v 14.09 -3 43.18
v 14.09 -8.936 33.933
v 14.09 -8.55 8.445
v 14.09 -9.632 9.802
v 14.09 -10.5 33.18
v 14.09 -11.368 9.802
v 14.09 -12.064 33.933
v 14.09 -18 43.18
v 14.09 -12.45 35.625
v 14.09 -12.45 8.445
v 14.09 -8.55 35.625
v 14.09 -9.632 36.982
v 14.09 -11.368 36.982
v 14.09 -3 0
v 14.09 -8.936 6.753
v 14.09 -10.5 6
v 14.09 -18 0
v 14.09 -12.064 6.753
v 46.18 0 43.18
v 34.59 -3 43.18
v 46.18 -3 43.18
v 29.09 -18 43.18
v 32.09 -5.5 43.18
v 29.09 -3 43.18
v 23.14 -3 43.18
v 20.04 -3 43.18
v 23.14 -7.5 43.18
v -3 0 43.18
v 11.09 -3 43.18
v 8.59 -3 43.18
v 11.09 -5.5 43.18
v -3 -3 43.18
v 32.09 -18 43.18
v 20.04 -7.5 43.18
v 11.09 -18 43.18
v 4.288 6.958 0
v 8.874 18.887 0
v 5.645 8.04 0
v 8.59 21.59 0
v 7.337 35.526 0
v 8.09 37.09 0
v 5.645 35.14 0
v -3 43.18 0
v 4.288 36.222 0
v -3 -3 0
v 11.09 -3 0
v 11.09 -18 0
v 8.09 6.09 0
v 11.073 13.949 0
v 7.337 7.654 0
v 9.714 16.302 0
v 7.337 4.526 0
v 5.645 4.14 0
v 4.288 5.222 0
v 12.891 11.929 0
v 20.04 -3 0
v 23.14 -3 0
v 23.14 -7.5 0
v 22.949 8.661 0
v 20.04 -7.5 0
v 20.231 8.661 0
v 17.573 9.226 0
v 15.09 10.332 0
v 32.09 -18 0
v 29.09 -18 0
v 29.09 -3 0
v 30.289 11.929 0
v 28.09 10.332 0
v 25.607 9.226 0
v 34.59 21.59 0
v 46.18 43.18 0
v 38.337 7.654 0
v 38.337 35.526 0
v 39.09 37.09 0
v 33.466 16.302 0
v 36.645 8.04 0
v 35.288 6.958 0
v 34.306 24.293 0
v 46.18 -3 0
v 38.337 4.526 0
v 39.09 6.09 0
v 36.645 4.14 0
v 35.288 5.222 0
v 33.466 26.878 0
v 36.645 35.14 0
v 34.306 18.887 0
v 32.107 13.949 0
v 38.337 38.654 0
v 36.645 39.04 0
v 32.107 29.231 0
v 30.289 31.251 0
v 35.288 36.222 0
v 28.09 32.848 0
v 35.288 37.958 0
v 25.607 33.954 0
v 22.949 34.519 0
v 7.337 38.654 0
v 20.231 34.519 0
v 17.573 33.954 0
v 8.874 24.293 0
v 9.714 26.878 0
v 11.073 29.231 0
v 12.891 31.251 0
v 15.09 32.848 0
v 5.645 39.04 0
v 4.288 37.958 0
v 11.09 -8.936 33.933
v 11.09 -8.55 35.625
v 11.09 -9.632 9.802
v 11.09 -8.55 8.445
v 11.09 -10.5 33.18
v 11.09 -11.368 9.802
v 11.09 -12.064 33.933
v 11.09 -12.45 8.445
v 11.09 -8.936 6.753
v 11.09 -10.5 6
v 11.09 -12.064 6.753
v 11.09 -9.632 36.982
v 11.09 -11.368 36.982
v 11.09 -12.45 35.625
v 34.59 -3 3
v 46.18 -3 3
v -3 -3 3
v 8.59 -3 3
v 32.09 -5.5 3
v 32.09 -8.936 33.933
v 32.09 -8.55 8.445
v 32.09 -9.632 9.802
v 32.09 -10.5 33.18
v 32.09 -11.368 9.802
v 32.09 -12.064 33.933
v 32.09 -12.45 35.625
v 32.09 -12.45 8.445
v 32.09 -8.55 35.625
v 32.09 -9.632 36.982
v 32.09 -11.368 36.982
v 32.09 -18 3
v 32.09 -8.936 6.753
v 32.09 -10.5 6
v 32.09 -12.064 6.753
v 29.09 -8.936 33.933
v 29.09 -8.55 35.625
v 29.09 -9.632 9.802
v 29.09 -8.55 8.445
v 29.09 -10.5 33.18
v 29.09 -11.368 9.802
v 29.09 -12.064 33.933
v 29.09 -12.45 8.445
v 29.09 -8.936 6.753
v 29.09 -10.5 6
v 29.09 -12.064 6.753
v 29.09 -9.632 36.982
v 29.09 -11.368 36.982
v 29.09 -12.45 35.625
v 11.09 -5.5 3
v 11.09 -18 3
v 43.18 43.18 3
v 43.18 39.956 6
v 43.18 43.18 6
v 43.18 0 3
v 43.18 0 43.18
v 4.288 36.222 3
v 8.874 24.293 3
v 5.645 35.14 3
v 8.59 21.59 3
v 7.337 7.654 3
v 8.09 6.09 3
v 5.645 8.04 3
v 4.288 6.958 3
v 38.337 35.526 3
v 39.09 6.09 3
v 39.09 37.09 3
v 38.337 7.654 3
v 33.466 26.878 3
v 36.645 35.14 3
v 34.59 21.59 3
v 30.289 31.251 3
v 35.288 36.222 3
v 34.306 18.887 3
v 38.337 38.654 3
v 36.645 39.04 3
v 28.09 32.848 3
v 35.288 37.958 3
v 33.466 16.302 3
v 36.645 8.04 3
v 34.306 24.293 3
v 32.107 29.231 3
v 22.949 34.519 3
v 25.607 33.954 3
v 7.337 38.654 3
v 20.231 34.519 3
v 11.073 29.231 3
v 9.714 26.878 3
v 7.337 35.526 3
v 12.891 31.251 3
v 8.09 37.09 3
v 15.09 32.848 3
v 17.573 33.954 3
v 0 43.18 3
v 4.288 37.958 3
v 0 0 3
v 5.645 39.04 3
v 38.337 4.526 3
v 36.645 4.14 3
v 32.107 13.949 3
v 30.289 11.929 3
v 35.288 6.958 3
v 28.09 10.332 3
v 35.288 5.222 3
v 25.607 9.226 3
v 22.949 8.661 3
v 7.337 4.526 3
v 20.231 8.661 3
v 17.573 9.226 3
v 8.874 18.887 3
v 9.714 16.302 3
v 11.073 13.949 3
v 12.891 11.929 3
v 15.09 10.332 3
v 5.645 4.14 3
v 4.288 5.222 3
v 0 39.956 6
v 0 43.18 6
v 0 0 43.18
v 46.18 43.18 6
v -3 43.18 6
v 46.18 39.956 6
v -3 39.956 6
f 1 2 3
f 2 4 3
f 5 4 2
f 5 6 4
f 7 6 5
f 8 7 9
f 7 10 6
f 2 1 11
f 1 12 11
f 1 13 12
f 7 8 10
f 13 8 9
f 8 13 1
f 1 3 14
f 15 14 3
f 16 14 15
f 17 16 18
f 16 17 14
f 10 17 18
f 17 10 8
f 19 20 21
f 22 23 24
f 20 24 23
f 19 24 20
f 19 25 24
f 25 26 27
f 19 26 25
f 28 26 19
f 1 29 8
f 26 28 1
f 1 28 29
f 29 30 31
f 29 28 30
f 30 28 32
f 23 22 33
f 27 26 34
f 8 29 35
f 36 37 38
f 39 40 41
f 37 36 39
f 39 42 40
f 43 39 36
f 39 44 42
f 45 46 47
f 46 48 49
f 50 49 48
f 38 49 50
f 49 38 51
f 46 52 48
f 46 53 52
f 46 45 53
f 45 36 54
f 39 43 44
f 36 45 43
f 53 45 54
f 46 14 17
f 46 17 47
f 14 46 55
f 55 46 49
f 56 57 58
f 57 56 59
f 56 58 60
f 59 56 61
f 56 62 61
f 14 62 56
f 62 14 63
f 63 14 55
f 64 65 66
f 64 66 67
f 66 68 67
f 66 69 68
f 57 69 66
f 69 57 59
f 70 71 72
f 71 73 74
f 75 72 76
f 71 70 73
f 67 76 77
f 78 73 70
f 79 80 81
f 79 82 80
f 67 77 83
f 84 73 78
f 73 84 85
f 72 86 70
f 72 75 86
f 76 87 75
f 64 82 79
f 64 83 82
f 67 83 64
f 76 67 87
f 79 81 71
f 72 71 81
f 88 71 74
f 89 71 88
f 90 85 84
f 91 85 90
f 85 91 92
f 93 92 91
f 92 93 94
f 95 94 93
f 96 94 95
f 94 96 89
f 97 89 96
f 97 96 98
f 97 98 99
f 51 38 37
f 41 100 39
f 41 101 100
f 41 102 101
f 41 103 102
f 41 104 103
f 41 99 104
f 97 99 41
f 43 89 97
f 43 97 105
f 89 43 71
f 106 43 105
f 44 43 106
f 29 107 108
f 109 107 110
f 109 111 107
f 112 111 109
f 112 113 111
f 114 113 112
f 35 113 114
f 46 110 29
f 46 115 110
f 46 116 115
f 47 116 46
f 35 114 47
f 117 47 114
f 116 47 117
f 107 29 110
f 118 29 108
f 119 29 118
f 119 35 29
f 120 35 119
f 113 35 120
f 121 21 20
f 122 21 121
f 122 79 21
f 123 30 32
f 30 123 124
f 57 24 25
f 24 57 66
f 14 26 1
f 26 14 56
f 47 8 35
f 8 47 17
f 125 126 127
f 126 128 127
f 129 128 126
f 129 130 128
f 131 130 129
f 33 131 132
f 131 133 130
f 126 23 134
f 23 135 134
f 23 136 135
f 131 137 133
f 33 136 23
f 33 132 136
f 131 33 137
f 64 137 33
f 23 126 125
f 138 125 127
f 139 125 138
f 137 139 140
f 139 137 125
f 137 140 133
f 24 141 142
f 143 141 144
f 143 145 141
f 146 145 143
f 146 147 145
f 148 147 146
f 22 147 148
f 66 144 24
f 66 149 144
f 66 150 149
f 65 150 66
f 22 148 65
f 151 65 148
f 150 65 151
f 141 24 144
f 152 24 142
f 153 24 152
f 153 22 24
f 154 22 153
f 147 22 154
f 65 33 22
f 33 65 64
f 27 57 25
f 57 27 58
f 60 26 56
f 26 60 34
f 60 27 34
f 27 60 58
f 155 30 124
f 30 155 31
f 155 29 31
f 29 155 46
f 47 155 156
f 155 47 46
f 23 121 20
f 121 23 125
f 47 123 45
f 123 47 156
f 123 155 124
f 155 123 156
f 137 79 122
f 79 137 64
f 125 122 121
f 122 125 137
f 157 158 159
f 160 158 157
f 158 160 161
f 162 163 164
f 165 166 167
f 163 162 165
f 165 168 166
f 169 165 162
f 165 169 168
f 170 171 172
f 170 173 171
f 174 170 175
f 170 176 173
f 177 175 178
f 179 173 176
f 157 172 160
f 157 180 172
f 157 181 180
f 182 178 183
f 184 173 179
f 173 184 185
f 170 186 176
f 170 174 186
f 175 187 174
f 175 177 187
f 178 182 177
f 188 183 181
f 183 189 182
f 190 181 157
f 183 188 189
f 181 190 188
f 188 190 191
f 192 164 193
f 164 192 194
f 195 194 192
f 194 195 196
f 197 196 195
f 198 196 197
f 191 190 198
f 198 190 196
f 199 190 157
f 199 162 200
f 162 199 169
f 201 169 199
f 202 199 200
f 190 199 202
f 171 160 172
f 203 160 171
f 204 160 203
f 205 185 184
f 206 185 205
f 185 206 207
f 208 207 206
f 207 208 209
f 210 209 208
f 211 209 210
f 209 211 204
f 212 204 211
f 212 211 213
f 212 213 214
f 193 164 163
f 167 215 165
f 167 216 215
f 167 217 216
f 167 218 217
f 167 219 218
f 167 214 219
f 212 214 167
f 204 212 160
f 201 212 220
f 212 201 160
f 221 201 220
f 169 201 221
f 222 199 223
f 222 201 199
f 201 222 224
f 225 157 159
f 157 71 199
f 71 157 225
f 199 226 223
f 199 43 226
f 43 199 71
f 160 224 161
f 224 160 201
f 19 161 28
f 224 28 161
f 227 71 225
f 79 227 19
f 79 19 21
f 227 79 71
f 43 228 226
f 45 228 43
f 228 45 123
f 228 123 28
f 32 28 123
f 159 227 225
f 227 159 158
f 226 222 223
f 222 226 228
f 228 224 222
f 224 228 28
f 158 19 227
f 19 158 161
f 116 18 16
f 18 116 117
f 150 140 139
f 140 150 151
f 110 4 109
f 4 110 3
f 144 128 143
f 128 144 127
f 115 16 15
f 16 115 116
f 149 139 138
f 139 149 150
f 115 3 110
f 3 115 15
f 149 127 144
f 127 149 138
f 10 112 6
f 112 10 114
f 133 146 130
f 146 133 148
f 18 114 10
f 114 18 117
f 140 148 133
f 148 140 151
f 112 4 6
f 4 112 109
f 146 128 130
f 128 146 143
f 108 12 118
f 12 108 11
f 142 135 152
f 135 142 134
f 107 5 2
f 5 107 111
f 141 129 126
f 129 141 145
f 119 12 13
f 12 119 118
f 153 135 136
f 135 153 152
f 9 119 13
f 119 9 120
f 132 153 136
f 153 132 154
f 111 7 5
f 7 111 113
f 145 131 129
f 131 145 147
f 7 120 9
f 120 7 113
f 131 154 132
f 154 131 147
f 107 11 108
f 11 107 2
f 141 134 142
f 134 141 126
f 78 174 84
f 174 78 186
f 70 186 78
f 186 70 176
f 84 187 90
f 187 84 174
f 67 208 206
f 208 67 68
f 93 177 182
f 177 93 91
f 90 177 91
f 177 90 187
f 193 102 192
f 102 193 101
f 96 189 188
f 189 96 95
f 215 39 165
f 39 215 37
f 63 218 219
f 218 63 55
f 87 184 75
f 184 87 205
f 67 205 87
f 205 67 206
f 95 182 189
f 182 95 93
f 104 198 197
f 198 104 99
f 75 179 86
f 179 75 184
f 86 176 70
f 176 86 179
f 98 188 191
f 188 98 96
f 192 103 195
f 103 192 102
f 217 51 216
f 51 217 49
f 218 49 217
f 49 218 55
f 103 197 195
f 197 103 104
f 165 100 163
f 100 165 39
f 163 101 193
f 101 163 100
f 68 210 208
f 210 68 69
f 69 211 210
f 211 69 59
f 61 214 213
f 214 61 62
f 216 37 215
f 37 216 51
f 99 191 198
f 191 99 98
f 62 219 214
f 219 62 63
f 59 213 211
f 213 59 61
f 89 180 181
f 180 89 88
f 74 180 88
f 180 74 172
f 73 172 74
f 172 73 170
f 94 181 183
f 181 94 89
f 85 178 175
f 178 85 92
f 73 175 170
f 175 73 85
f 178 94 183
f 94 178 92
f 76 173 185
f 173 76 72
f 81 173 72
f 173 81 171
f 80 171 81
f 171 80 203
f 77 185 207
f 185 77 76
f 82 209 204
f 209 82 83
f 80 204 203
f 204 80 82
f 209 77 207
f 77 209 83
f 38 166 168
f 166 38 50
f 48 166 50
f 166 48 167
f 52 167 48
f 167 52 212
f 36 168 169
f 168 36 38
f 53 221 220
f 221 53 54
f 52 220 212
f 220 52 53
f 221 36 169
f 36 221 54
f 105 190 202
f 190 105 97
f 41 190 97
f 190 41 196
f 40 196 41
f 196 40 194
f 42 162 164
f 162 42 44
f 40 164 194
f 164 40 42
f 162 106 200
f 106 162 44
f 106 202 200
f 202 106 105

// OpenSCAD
//CUSTOMIZER VARIABLES

/* [Basic_Parameters] */

// Stepper Motor Size
motor_index = 4;	// [0:NEMA 8, 1:NEMA 11, 2:NEMA 14, 3:NEMA 16, 4:NEMA 17, 5:NEMA 23, 6:NEMA 34, 7:NEMA 42]

// Parallel or Perpendicular (will need supports)
orientation = 0;	// [0:Parallel, 1:Perpendicular]

// mount thickness, in mm
thickness = 3.0;    // [2:0.1:10]

// Openbeam size, in mm
openbeam_size = 15;   // [10:50]

// Openbeam bolt diameter, in mm
beam_bolt_diameter = 3.0;    // [2:0.1:40]

// Openbeam slot diameter for tight fit, in mm
slot_diameter = 3.1;    // [2:0.1:40]

// Openbeam slot distance to edge for tight fit, in mm
slot_depth = 4.5;    // [2:0.1:40]

//CUSTOMIZER VARIABLES END



// use motor size choice to set the important values

// Values are from multiple sources - nobody seems to have all the numbers right in one place!
// And even different manufacturers can't quite agree on all the dimensions!
// I'm open to corrections and additions - but there had better be a good source behind the new values.

// [ motor width in mm (calculated from inches/10), bolt size in mm, bolt spacing in mm, center hole diameter in mm, name ]
motor_templates = [
    [ 0.8*25.4,   2,    16,   15, "NEMA 8"  ],
    [ 1.1*25.4, 2.5,    23,   22, "NEMA 11" ],
    [ 1.4*25.4,   3,    26,   22, "NEMA 14" ],
    [ 1.6*25.4,   3,    31,   22, "NEMA 16" ],
    [ 1.7*25.4,   3,    31,   22, "NEMA 17" ],
    [ 2.3*25.4, 5.0,  47.1, 38.1, "NEMA 23" ],
    [ 3.4*25.4, 6.5,  69.6,   73, "NEMA 34" ],
    [ 4.2*25.4, 8.5,  89.0, 55.5, "NEMA 42" ],
];

motor_width = motor_templates[motor_index][0];
bolt_diameter = motor_templates[motor_index][1];
bolt_radius = (bolt_diameter+1) / 2;
bolt_spacing = motor_templates[motor_index][2];
bolt_inset = (motor_width - bolt_spacing) / 2;
center_diameter = motor_templates[motor_index][3];
center_radius = (center_diameter+4) / 2; // 3 mm margin wasn't quite enough on some motors

temp_length = max( motor_width, 5*beam_bolt_diameter );
temp_width = max( motor_width, openbeam_size+thickness*2 );
temp_length2 = max( motor_width, openbeam_size+thickness*2 );
temp_width2 = max( motor_width, 5*beam_bolt_diameter );
mount_width = (orientation == 1) ? temp_width2 : temp_width;
mount_length = (orientation == 1) ? temp_length2 : temp_length;
mount_offset_x = (mount_width - motor_width) / 2;
mount_offset_z = (mount_length - motor_width) / 2;
beam_bolt_radius = (beam_bolt_diameter+1) / 2;


// Sanity checks
if( motor_width <= 0 || bolt_diameter <= 0
    || openbeam_size <= 0 || beam_bolt_diameter <= 0
    || slot_diameter <= 0 || slot_depth <= 0)
{
    echo("<B>Error: Missing important parameters, possibly wrong motor index</B>");
}

// Sanity checks
if( openbeam_size <= 2*beam_bolt_diameter ||
    openbeam_size <= 2*slot_diameter ||
    openbeam_size <= 2*slot_depth)
{
    echo("<B>Error: Parameters result in bad beam attachment</B>");
}


// our object, flat on xy plane for easy STL generation
motor_mount();

module motor_mount(){
   
   openbeam_radius = openbeam_size/2;
    
   difference() {
     
     // stuff to build up
     union() {
        
         // motor mounting plate
        cube([motor_width,motor_width,thickness]);
        
        // plate on side along openbeam
        padded_length = (orientation == 1) ? mount_length+thickness : mount_length;
        padded_width = mount_width+thickness*2;
        translate([-mount_offset_x-thickness,-thickness,0])
          cube([padded_width,thickness,padded_length]);
        
        // motor side pieces for strength
        translate([motor_width,-thickness,0])
          cube([thickness,motor_width+thickness,thickness*2]);
        translate([-thickness,-thickness,0])
          cube([thickness,motor_width+thickness,thickness*2]);
        
        // angle connections on sides for strength
        tri_y = motor_width;
        tri_z = mount_length - ((orientation == 0) ? thickness : 0);
        translate([0,0,thickness])
          rotate([0,-90,0])
            linear_extrude(thickness)
              polygon( [ [0, tri_y], [tri_z, 0], [0, 0] ] );
        translate([motor_width+thickness,0,thickness])
          rotate([0,-90,0])
            linear_extrude(thickness)
              polygon( [ [0, tri_y], [tri_z, 0], [0, 0] ] );
        
        if (orientation == 0) {
            
          // openbeam connectors
          translate([(mount_width/2)-openbeam_radius-thickness-mount_offset_x,-openbeam_size-thickness,0])
            cube([thickness,openbeam_size,mount_length]);
          translate([(mount_width/2)+openbeam_radius-mount_offset_x,-openbeam_size-thickness,0])
            cube([thickness,openbeam_size,mount_length]);
            
          // openbeam slot (to limit twisting - also helps hold mount inplace while you add bolts)
          translate([(mount_width/2)-slot_diameter/2-mount_offset_x,-thickness-slot_depth,0])
            cube([slot_diameter,slot_depth,mount_length]);

          // hacky fillet for strength along openbeam
          fillet_size = max( 1, min( thickness-0.5, openbeam_radius-beam_bolt_radius-1) );
          fillet_x = (mount_width/2)-openbeam_radius-thickness-mount_offset_x;
          fillet_y = -thickness-fillet_size;
          linear_extrude(mount_length)
            polygon( [ [fillet_x, fillet_y], [fillet_x, -thickness], [fillet_x-fillet_size, -thickness] ] );

          fillet2_x = (mount_width/2)+openbeam_radius-mount_offset_x+thickness;
          linear_extrude(mount_length)
            polygon( [ [fillet2_x, fillet_y], [fillet2_x, -thickness], [fillet2_x+fillet_size, -thickness] ] );
          
          
          // angle connectors on top and bottom for strength
          tri2_y = -openbeam_size - thickness;
          tri2_x = (mount_width/2)-openbeam_radius-thickness-mount_offset_x;
          tri2_x2 = -mount_offset_x-thickness;
          linear_extrude(thickness)
            polygon( [ [tri2_x, tri2_y], [tri2_x, -thickness], [tri2_x2, -thickness] ] );
        
          tri2_x3 = (mount_width/2)+openbeam_radius-mount_offset_x+thickness;
          tri2_x4 = mount_width-mount_offset_x+thickness;
          linear_extrude(thickness)
            polygon( [ [tri2_x3, tri2_y], [tri2_x3, -thickness], [tri2_x4, -thickness] ] );

          // these make it difficult to FDM print without support, but are fine for powder prints
          if (false) {
            translate([0,0,mount_length-thickness])
              linear_extrude(thickness)
                polygon( [ [tri2_x, tri2_y], [tri2_x, -thickness], [tri2_x2, -thickness] ] );
            translate([0,0,mount_length-thickness])
              linear_extrude(thickness)
                polygon( [ [tri2_x3, tri2_y], [tri2_x3, -thickness], [tri2_x4, -thickness] ] );
          }
        
        } else {    // orientation
          
          // openbeam connectors
          translate([-thickness-mount_offset_x, -openbeam_size-thickness, (mount_length/2)-openbeam_radius-thickness/2])
            cube([padded_width, openbeam_size, thickness]);
          translate([-thickness-mount_offset_x,-openbeam_size-thickness,(mount_length/2)+openbeam_radius+thickness/2])
            cube([padded_width, openbeam_size, thickness]);

          // openbeam slot (to limit twisting - also helps hold mount inplace while you add bolts)
          translate([-thickness-mount_offset_x,-thickness-slot_depth,(mount_length/2)])
            cube([padded_width,slot_depth,slot_diameter]);
          
          // hacky fillet for strength along openbeam
          fillet_size = max( 1, min( thickness-0.5, openbeam_radius-beam_bolt_radius-1) );
          fillet_x = (mount_length/2)-openbeam_radius-thickness-mount_offset_z;
          fillet_y = -thickness-fillet_size;
          translate([-thickness-mount_offset_x,0,mount_length-mount_offset_z])
            rotate([0,90,0])
              linear_extrude(padded_width)
                polygon( [ [fillet_x, fillet_y], [fillet_x, -thickness], [fillet_x-fillet_size, -thickness] ] );

          fillet2_x = (mount_width/2)+openbeam_radius-mount_offset_x+thickness;
          translate([-thickness-mount_offset_x,0,mount_length+thickness-mount_offset_z])
            rotate([0,90,0])
              linear_extrude(padded_width)
                polygon( [ [fillet2_x, fillet_y], [fillet2_x, -thickness], [fillet2_x+fillet_size, -thickness] ] );

          // angle connectors on left and right, top and bottom for strength
          tri2_y = -openbeam_size - thickness;
          tri2_x = (mount_length/2)-openbeam_radius-thickness-mount_offset_z-thickness/2;
          tri2_x2 = -mount_offset_z-thickness;
          translate([-thickness-mount_offset_x,0,mount_length-mount_offset_z])
            rotate([0,90,0])
              linear_extrude(thickness)
                polygon( [ [tri2_x, tri2_y], [tri2_x, -thickness], [tri2_x2, -thickness] ] );
 
          tri2_x3 = (mount_length/2)+openbeam_radius-mount_offset_z+thickness+thickness/2;
          tri2_x4 = mount_length-mount_offset_z+thickness;
          translate([-thickness-mount_offset_x,0,mount_length+thickness-mount_offset_z])
            rotate([0,90,0])
              linear_extrude(thickness)
                polygon( [ [tri2_x3, tri2_y], [tri2_x3, -thickness], [tri2_x4, -thickness] ] );

          translate([mount_width-mount_offset_x,0,mount_length-mount_offset_z])
            rotate([0,90,0])
              linear_extrude(thickness)
                polygon( [ [tri2_x, tri2_y], [tri2_x, -thickness], [tri2_x2, -thickness] ] );

          translate([mount_width-mount_offset_x,0,mount_length+thickness-mount_offset_z])
            rotate([0,90,0])
              linear_extrude(thickness)
                polygon( [ [tri2_x3, tri2_y], [tri2_x3, -thickness], [tri2_x4, -thickness] ] );

        }   // orientation
     
     }
    
     // and stuff to subtract
    
     // center motor hole
     translate([motor_width/2,motor_width/2,-1])
       cylinder(thickness+2,center_radius,center_radius);
    
     // bolt holes for motor
     translate([motor_width-bolt_inset,motor_width-bolt_inset,-1])
       cylinder(thickness+2,bolt_radius,bolt_radius);
     translate([motor_width-bolt_inset,bolt_inset,-1])
       cylinder(thickness+2,bolt_radius,bolt_radius);
     translate([bolt_inset,bolt_inset,-1])
       cylinder(thickness+2,bolt_radius,bolt_radius);
     translate([bolt_inset,motor_width-bolt_inset,-1])
       cylinder(thickness+2,bolt_radius,bolt_radius);
    
     // bolt holes for openbeam
     if (orientation == 0) {
       end_offset = min( mount_length/3.25, max(2*thickness,2*beam_bolt_diameter) + beam_bolt_radius );
       translate([-thickness*2,-thickness-openbeam_size/2,end_offset])
        rotate([0,90,0])
          cylinder(mount_width+thickness*2,beam_bolt_radius,beam_bolt_radius);
       translate([-thickness*2,-thickness-openbeam_size/2,mount_length-end_offset])
        rotate([0,90,0])
          cylinder(mount_width+thickness*2,beam_bolt_radius,beam_bolt_radius);
     } else {
       end_offset = min( mount_width/3.25, max(2*thickness,2*beam_bolt_diameter) + beam_bolt_radius );
       translate([end_offset-mount_offset_x,-thickness-openbeam_size/2,0])
          cylinder(mount_length+thickness*2,beam_bolt_radius,beam_bolt_radius);
       translate([mount_width-end_offset-mount_offset_x,-thickness-openbeam_size/2,0])
          cylinder(mount_length+thickness*2,beam_bolt_radius,beam_bolt_radius);
     }
   }
    
}
